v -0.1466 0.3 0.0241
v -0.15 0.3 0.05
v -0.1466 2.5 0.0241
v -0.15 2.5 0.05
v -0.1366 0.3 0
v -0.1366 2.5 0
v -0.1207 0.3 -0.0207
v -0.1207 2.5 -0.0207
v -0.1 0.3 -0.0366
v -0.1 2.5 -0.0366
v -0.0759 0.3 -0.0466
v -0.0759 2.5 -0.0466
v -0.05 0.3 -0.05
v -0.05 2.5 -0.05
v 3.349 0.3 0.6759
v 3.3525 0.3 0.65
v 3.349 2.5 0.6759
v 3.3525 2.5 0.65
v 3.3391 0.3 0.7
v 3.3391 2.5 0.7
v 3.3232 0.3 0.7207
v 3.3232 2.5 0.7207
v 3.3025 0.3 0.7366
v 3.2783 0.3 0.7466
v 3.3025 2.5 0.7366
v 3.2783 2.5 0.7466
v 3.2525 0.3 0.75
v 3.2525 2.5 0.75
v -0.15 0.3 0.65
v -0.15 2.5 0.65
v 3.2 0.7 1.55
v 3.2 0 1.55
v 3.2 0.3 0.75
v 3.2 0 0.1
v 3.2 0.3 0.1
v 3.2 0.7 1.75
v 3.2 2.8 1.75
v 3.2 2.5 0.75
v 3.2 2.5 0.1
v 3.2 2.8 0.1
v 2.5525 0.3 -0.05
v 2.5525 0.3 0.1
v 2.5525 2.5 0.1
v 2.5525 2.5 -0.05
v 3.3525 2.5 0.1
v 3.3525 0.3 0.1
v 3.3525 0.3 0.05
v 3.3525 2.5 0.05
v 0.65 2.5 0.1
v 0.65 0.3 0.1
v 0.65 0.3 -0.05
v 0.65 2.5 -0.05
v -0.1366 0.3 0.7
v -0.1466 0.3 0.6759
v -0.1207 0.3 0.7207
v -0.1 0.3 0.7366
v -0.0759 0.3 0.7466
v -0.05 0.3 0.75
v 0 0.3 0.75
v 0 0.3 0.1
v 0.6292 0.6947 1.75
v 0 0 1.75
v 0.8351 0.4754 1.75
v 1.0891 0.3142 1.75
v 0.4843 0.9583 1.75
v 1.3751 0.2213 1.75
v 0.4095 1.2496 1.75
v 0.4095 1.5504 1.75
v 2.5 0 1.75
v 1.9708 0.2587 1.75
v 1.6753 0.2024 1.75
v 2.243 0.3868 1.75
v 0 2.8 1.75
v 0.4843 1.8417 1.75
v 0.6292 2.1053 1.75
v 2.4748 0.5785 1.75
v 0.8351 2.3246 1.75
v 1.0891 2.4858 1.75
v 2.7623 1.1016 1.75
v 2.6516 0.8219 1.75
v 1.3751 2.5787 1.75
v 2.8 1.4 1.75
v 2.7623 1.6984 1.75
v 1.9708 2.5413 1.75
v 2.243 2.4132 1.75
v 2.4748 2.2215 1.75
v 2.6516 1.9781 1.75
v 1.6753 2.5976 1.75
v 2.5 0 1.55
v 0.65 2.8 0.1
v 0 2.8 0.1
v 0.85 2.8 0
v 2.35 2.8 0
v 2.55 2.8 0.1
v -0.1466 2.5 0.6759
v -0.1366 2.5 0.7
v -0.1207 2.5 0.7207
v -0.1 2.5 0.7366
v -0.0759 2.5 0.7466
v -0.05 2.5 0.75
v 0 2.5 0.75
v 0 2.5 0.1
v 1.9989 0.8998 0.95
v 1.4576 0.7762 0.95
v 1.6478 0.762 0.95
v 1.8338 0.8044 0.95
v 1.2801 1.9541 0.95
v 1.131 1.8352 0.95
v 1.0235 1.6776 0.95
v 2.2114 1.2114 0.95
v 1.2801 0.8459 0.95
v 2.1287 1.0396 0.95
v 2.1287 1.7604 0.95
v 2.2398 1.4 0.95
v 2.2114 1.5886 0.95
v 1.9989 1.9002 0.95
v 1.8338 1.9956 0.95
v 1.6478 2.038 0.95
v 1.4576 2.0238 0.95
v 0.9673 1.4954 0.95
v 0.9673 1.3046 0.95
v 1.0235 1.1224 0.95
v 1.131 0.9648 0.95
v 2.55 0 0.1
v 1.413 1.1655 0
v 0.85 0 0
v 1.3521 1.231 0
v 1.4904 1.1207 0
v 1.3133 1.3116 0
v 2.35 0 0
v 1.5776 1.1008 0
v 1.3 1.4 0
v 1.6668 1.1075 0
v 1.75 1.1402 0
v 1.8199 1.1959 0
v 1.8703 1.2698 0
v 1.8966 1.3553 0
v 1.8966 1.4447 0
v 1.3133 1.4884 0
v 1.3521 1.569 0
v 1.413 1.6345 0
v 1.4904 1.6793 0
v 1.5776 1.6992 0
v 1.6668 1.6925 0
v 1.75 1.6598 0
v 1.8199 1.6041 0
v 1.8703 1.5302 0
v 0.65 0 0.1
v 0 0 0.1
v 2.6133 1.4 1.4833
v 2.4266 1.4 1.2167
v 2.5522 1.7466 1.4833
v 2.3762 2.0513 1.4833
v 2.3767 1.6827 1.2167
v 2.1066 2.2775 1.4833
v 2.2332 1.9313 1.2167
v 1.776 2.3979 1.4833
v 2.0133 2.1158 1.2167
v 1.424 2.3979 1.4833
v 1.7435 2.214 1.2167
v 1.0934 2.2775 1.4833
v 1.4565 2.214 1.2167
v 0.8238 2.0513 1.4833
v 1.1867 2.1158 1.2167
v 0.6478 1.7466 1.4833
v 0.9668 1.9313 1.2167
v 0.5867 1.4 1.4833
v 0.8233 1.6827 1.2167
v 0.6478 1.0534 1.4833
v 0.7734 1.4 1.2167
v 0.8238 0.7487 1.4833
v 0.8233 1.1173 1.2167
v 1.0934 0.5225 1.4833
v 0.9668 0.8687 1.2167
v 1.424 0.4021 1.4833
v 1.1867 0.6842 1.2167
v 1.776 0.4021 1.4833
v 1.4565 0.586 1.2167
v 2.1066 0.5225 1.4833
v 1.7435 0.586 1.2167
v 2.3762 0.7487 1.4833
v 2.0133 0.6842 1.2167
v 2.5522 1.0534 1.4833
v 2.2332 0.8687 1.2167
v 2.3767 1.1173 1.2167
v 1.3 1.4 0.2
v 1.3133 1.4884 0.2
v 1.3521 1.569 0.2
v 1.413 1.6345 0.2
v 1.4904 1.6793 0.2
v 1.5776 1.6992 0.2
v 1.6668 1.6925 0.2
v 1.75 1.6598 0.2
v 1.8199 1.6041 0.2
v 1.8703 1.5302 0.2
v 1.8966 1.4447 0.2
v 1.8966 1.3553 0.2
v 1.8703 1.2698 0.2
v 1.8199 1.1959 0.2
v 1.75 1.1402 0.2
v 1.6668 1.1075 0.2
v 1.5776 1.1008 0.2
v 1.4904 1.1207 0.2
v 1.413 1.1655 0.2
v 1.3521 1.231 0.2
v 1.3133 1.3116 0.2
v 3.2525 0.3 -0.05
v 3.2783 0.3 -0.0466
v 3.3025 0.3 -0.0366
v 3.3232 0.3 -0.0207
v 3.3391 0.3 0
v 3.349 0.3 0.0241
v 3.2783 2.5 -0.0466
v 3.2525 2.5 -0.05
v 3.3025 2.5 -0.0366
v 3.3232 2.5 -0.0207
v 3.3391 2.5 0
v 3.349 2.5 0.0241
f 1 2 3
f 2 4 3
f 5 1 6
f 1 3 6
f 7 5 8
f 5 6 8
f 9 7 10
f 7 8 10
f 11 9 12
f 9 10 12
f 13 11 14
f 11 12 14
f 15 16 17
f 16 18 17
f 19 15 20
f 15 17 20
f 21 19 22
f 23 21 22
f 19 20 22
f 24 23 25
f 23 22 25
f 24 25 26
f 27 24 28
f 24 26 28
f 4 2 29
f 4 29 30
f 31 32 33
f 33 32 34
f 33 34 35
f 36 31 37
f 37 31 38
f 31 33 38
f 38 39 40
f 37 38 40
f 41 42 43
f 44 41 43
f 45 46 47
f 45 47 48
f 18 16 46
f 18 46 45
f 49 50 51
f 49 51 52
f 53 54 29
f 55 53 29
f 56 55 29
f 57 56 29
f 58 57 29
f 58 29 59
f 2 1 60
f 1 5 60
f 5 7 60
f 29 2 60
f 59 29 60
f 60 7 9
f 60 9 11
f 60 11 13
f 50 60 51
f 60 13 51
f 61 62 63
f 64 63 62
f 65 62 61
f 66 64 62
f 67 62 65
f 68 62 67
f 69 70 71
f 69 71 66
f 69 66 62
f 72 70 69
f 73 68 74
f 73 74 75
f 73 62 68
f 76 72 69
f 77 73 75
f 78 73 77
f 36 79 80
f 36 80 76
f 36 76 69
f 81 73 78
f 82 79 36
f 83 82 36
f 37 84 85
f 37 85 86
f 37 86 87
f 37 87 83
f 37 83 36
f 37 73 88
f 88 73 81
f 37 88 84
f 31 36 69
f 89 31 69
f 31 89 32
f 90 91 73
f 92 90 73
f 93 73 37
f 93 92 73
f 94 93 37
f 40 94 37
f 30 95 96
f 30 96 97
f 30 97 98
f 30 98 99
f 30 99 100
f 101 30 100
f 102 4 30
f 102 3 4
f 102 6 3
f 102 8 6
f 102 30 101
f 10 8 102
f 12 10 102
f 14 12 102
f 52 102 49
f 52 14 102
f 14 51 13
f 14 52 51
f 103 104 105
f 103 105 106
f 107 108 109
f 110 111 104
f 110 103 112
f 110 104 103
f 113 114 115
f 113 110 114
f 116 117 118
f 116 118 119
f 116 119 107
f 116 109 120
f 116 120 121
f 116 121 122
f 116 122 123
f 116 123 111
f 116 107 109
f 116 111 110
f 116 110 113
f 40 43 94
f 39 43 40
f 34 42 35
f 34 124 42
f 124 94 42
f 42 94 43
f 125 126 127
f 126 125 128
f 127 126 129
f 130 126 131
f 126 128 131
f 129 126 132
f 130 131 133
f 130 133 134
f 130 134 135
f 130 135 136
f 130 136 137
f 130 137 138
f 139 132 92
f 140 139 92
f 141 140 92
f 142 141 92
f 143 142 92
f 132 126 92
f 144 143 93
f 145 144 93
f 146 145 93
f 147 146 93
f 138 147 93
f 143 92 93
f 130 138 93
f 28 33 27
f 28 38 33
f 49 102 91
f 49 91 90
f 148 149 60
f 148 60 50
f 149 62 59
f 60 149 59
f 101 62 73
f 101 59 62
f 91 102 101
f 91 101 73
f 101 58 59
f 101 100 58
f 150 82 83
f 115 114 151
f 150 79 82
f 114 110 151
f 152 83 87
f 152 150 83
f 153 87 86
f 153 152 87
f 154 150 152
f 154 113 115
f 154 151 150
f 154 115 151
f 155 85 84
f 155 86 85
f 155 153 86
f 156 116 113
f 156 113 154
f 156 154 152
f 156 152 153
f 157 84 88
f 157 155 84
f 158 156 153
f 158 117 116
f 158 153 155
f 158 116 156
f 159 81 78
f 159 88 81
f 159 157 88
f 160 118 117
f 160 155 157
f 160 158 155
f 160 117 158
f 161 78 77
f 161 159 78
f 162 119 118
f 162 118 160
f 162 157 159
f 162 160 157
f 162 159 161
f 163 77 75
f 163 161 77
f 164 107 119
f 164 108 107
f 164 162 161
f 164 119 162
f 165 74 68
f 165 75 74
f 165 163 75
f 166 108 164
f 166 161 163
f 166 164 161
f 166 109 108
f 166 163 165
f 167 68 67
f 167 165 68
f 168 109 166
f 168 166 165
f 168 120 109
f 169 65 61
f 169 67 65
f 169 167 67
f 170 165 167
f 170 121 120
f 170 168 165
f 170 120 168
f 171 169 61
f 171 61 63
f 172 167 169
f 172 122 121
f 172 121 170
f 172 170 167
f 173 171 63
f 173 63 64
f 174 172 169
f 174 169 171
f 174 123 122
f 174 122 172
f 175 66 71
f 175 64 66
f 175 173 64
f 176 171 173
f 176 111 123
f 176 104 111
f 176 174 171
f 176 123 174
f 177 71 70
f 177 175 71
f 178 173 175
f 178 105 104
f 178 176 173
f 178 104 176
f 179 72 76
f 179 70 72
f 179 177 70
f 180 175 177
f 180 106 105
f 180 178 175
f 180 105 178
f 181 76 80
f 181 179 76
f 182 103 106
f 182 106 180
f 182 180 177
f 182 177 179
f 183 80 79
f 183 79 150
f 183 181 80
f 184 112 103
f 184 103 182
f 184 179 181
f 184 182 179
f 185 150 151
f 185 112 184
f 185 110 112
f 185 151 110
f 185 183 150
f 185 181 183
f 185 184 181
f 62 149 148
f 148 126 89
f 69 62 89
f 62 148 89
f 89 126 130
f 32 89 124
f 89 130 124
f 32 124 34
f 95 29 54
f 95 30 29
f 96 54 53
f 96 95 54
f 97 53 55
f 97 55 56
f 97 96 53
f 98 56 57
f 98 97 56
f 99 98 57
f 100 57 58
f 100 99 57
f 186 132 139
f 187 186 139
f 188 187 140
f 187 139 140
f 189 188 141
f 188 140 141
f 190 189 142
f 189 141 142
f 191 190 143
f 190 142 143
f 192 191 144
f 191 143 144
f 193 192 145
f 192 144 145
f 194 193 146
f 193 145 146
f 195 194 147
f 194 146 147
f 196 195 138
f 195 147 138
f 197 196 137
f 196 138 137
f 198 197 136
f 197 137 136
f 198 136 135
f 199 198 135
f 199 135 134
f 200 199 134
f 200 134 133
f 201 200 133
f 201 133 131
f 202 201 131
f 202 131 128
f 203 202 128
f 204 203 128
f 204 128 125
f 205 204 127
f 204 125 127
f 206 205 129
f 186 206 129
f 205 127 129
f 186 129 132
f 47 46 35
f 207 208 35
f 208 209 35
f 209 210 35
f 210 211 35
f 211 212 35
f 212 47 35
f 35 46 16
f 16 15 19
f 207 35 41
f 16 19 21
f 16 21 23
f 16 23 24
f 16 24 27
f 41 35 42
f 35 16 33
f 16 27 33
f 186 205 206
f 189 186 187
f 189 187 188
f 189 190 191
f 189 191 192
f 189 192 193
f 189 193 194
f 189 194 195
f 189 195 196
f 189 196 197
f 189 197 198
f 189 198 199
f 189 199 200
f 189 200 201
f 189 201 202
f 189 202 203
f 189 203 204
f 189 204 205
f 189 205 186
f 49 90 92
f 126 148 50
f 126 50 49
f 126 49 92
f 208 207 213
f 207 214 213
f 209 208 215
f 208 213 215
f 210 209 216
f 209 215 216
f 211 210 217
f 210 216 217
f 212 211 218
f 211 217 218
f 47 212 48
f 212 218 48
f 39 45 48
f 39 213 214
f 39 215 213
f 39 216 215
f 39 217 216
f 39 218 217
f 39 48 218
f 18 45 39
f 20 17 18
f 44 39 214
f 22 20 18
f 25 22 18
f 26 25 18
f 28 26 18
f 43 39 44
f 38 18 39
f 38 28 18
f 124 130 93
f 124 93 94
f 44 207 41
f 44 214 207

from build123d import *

# Parameters (mm, degrees)
SKETCH1_W           = 3.2
SKETCH1_H           = 2.8
BOSS_EXTRUDE1_DEPTH = 1.75
CUT_EXTRUDE1_DEPTH  = 0.2
SKETCH3_R           = 1.2
CUT_EXTRUDE2_DEPTH  = 0.8
CUT_EXTRUDE2_TAPER  = 35
CUT_EXTRUDE3_DEPTH  = 3.8
SKETCH6_W           = 0.8
SKETCH6_H           = 2.2
BOSS_EXTRUDE3_DEPTH = 0.15
SKETCH7_W           = 0.15
SKETCH7_H           = 2.2
SKETCH7_W_2         = 0.152457207
BOSS_EXTRUDE4_DEPTH = 0.65
FILLET1_R           = 0.1
SKETCH8_R           = 0.3
CUT_EXTRUDE4_DEPTH  = 0.2


with BuildPart() as part:
    # Sketch1 → Boss-Extrude1 (new body)
    with BuildSketch(Plane.XY):
        with Locations((1.6, 1.4)):
            Rectangle(SKETCH1_W, SKETCH1_H)
    extrude(amount=BOSS_EXTRUDE1_DEPTH)

    # Sketch2 → Cut-Extrude1 (cut)
    with BuildSketch(Plane.XY.offset(1.75)):
        Polygon((3.2, 0), (3.2, 0.7), (2.5, 0), align=None)
    extrude(amount=-CUT_EXTRUDE1_DEPTH, mode=Mode.SUBTRACT)

    # Sketch3 → Cut-Extrude2 (cut)
    with BuildSketch(Plane.XY.offset(1.75)):
        with Locations((1.6, 1.4)):
            Circle(SKETCH3_R)
    extrude(amount=-CUT_EXTRUDE2_DEPTH, taper=CUT_EXTRUDE2_TAPER, mode=Mode.SUBTRACT)

    # Sketch5 → Cut-Extrude3 (cut, through all)
    with BuildSketch(Plane.XZ):
        Polygon((0, 0.1), (0.65, 0.1), (0.85, 0), (0.65, 0), (0, 0), align=None)
        Polygon((2.55, 0.1), (3.2, 0.1), (3.2, 0), (2.55, 0), (2.35, 0), align=None)
    extrude(amount=-CUT_EXTRUDE3_DEPTH, mode=Mode.SUBTRACT)

    # Sketch6 → Boss-Extrude3 (add)
    with BuildSketch(Plane(origin=(0, 0, 0.1), x_dir=(-1, 0, 0), z_dir=(0, 0, -1))):
        with Locations((-2.952457207, 1.4)):
            Rectangle(SKETCH6_W, SKETCH6_H)
        with Locations((-0.25, 1.4)):
            Rectangle(SKETCH6_W, SKETCH6_H)
    extrude(amount=BOSS_EXTRUDE3_DEPTH)

    # Sketch7 → Boss-Extrude4 (add)
    with BuildSketch(Plane.XY.offset(0.1)):
        with Locations((-0.075, 1.4)):
            Rectangle(SKETCH7_W, SKETCH7_H)
        with Locations((3.276228603, 1.4)):
            Rectangle(SKETCH7_W_2, SKETCH7_H)
    extrude(amount=BOSS_EXTRUDE4_DEPTH)

    # Fillet1
    fillet1_edges = [part.edges().sort_by_distance(p)[0] for p in [
        (3.352457207, 1.4, 0.75),
        (3.352457207, 1.4, -0.05),
        (-0.15, 1.4, -0.05),
        (-0.15, 1.4, 0.75),
    ]]
    fillet(fillet1_edges, radius=FILLET1_R)

    # Sketch8 → Cut-Extrude4 (cut)
    with BuildSketch(Plane(origin=(0, 0, 0), x_dir=(-1, 0, 0), z_dir=(0, 0, -1))):
        with Locations((-1.6, 1.4)):
            Circle(SKETCH8_R)
    extrude(amount=-CUT_EXTRUDE4_DEPTH, mode=Mode.SUBTRACT)


solid = part.part
